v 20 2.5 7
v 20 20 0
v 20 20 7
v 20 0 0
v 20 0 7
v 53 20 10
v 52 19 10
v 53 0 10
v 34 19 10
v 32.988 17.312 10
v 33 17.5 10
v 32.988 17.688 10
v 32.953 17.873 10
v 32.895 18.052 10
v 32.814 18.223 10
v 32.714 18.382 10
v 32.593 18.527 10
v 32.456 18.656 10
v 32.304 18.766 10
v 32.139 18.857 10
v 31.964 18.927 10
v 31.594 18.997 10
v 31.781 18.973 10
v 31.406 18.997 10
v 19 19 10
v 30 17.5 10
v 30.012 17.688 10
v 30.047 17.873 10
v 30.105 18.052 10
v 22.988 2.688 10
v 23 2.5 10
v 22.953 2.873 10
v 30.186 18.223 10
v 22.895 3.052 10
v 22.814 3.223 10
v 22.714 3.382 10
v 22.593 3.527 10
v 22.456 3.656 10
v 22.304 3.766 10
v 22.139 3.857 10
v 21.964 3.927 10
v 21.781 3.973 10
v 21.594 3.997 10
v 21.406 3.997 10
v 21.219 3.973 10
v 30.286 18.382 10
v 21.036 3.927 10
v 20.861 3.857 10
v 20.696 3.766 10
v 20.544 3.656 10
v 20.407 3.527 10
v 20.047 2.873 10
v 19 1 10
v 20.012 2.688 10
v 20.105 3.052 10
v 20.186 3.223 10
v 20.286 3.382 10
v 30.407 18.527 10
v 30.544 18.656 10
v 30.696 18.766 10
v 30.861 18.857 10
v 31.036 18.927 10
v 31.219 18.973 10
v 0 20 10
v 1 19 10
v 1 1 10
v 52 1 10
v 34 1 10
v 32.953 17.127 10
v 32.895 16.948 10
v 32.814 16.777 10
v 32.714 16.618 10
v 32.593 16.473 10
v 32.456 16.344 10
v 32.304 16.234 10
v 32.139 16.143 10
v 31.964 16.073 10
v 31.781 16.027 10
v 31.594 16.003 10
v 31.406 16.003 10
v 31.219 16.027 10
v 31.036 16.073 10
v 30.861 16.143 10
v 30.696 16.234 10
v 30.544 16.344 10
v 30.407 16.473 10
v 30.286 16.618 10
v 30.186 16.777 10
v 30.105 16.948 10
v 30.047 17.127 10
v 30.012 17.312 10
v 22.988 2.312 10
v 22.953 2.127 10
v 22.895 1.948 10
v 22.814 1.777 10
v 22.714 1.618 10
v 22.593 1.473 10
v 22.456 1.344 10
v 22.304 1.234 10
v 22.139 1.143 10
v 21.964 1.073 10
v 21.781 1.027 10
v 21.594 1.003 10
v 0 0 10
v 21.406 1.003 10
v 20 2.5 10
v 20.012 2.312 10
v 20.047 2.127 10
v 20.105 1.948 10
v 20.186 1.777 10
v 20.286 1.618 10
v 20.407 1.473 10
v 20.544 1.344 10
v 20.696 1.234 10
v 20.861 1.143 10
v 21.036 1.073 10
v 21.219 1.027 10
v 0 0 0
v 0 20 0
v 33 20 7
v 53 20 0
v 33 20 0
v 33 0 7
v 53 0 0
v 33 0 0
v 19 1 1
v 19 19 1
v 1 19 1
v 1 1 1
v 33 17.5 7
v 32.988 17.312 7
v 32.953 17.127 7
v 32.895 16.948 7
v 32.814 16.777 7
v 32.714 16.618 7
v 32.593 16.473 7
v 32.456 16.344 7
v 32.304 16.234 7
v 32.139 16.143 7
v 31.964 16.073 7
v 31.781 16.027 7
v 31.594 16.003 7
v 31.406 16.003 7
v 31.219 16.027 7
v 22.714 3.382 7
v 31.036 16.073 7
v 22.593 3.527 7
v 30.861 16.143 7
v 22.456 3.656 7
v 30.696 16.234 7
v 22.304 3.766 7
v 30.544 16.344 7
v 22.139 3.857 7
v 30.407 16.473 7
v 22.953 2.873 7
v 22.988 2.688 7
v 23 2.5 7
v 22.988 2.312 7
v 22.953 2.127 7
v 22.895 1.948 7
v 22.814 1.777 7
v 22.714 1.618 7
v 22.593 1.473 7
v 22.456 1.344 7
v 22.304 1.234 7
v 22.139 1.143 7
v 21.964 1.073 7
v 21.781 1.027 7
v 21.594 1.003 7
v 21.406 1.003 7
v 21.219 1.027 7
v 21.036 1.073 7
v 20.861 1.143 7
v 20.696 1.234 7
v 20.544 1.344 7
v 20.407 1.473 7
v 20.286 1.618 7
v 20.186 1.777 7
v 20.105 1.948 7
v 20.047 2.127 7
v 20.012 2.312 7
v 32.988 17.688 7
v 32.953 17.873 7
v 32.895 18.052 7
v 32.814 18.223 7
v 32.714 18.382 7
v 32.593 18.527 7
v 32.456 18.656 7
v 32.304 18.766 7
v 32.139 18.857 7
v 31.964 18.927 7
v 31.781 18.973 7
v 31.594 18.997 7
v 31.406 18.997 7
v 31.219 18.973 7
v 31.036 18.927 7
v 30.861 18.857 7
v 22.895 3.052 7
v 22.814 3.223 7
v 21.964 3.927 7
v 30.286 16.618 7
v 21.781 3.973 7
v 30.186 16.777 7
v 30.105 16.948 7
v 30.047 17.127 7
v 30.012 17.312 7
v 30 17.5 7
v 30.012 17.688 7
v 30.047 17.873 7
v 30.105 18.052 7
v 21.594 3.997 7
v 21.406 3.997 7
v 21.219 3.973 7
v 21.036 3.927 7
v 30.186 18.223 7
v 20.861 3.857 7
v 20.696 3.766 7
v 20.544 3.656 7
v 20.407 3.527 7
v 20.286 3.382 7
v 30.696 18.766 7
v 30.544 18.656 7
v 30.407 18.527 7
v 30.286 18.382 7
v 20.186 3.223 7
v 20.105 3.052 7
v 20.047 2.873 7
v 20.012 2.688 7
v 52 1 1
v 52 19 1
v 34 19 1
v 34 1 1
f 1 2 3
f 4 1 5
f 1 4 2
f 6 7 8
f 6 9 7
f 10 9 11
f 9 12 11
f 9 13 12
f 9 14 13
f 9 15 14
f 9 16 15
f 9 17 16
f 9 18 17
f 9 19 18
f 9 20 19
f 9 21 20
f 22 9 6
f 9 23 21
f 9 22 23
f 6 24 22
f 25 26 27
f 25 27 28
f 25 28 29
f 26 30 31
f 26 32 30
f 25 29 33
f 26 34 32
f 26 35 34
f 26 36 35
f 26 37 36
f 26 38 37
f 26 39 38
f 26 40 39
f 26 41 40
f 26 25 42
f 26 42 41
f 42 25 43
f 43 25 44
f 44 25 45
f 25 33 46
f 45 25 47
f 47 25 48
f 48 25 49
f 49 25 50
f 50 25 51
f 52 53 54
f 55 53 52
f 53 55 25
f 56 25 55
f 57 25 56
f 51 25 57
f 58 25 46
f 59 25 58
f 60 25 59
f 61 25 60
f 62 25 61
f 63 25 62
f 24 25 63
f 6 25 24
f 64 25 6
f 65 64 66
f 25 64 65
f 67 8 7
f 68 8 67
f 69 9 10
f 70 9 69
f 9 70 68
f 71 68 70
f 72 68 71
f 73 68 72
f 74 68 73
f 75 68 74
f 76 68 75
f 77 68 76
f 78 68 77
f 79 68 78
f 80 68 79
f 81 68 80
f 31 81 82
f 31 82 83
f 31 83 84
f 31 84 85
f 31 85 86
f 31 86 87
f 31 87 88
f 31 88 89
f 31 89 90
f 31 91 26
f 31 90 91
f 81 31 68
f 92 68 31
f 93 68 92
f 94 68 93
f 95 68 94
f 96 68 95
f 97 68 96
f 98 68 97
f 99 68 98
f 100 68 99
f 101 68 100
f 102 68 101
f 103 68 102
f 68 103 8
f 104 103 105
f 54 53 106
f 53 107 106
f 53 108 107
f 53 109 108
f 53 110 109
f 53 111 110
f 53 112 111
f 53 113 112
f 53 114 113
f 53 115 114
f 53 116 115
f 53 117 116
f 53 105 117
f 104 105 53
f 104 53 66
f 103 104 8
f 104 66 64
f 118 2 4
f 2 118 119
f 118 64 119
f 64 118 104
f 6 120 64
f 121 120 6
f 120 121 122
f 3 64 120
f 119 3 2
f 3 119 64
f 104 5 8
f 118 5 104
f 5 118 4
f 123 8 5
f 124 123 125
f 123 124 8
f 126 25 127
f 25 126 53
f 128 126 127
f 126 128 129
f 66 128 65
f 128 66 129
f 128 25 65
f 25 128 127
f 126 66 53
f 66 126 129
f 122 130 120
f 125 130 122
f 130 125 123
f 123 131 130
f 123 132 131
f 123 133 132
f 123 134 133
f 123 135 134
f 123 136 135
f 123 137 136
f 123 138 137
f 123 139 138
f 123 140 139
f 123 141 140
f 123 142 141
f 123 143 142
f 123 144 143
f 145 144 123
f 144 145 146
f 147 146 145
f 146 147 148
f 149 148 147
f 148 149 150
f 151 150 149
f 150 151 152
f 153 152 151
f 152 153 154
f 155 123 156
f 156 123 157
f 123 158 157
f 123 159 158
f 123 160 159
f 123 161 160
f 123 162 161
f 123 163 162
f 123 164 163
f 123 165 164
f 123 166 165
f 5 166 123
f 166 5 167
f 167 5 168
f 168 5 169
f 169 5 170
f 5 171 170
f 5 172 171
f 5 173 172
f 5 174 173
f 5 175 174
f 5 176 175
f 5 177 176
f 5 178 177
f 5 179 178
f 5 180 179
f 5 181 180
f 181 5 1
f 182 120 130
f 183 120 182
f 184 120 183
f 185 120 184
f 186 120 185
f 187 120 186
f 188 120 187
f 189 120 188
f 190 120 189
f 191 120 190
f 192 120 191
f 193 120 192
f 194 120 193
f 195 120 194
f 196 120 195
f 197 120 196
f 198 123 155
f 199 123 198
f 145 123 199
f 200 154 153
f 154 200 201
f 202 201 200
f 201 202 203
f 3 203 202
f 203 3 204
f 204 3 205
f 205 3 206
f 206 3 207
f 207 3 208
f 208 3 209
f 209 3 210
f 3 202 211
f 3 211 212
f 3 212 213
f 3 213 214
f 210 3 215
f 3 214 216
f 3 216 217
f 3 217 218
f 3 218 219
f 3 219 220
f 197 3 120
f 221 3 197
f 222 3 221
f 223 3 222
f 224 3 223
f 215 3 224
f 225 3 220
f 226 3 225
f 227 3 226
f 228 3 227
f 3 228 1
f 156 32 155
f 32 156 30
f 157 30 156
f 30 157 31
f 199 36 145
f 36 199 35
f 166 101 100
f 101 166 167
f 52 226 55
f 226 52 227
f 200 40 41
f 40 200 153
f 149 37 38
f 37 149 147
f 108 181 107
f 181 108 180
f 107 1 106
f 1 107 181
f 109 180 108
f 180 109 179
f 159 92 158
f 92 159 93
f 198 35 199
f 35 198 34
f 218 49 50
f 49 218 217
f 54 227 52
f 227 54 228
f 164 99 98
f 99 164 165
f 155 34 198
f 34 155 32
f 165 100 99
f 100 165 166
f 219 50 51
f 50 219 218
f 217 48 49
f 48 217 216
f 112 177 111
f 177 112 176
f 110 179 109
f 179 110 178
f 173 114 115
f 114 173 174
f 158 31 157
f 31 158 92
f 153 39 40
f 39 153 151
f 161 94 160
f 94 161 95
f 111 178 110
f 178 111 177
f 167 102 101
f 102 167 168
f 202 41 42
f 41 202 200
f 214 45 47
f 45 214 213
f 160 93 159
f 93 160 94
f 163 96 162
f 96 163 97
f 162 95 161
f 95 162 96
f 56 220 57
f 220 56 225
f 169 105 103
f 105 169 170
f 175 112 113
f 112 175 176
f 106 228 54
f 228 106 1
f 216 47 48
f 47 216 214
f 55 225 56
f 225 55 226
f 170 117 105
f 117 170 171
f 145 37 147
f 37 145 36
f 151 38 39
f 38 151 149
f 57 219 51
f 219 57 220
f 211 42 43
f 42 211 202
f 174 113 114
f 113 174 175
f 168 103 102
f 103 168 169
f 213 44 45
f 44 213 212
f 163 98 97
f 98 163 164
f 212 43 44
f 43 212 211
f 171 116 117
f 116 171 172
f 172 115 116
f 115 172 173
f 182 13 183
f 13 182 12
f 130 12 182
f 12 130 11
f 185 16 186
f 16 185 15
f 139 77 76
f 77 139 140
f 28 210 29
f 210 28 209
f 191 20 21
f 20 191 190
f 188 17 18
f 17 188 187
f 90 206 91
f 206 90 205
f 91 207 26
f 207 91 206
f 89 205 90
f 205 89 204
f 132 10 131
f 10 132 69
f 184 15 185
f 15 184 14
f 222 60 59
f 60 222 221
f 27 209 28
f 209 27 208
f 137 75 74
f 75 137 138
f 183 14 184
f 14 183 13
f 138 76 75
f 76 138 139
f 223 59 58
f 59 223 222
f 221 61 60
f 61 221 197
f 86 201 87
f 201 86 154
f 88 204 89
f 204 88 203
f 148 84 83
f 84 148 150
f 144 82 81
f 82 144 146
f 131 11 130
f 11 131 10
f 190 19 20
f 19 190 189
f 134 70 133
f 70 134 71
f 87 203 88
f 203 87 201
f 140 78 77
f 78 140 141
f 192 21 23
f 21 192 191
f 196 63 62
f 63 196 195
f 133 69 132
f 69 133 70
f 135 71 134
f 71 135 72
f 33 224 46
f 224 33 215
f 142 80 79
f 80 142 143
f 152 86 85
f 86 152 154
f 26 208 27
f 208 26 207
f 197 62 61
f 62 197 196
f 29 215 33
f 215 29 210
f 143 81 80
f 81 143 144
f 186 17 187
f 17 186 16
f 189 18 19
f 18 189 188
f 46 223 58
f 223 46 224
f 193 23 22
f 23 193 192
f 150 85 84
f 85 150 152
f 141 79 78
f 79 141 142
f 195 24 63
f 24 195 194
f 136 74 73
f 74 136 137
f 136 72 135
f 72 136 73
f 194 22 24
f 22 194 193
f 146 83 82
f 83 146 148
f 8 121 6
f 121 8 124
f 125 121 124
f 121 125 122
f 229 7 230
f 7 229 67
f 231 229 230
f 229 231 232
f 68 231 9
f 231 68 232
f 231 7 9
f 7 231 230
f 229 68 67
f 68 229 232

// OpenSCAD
smallThickness = 1;
largeThickness = 2;
hugeThickness = 3;
boardThickness = 13;

gridLength = 20;
gridWidth = 20;
gridHeight = 10;
boardHeight = 3;


holeRadius = 1.5;

gridNumber = 1;
//--------------------------------------------------------
//outsideBox();

//translate([3*gridLength,0,0])  grids();
//translate([6*gridLength,0,0])outsideBox();
//translate([9*gridLength,0,0])  grid();
rotate( [0,0,0])
{
grids(gridNumber);
#translate([gridLength,0,0])  middleBoard(gridNumber);
translate([gridLength+boardThickness,0,0])grids(gridNumber);
$fn=50;
}



//--------------------------------------------------------
module outsideBox()
{
    
    difference()
    {
        difference()
        {
            translate([0,-largeThickness,-hugeThickness])
            cube([2*gridLength,7*gridWidth+2*largeThickness,gridHeight+2*hugeThickness]);
            
            cube([2*gridLength+ 1,7*gridWidth+1,gridHeight+1]);
        }
        translate([-2*largeThickness,0,0])
        cube([4*gridLength,7*gridWidth,gridHeight]);
    }
    
    
}


//a row of grids
module grids(gridNumber)
{
    for(i=[0:gridNumber-1])
    {
        translate([gridLength*0,gridWidth*i,0]) grid();
    }
//    translate([gridLength*0,gridWidth*0,0]) grid();
//    translate([gridLength*0,gridWidth*1,0]) grid();
//    translate([gridLength*0,gridWidth*2,0]) grid();
//    translate([gridLength*0,gridWidth*3,0]) grid();
//    translate([gridLength*0,gridWidth*4,0]) grid();
//    translate([gridLength*0,gridWidth*5,0]) grid();
//    translate([gridLength*0,gridWidth*6,0]) grid();
    
    
//    translate([gridLength*1,gridWidth*0,0]) grid();
//    translate([gridLength*1,gridWidth*1,0]) grid();
//    translate([gridLength*1,gridWidth*2,0]) grid();
//    translate([gridLength*1,gridWidth*3,0]) grid();
//    translate([gridLength*1,gridWidth*4,0]) grid();
//    translate([gridLength*1,gridWidth*5,0]) grid();
//    translate([gridLength*1,gridWidth*6,0]) grid();
}

module middleBoard(gridNumber)
{
    for(i=[0:gridNumber-1])
    {
        translate([gridLength*0,gridWidth*i,gridHeight -boardHeight])
        difference()
        {
            cube([boardThickness,gridWidth,boardHeight]);
            translate([holeRadius,holeRadius+1,-0.5]) boardHoles();
            translate([- holeRadius +boardThickness,gridWidth - holeRadius-1,-0.5]) boardHoles();
        }
    }
    
}

module grid()
{
    difference()
    {
        cube([gridLength,gridWidth,gridHeight]);
        translate([smallThickness,smallThickness,smallThickness])
        cube([gridLength- 2*smallThickness,gridWidth- 2*smallThickness,gridHeight]);
    }
}

//holes for one grid
module boardHoles()
{
    cylinder(r=holeRadius,h=gridHeight+1);
}
     
